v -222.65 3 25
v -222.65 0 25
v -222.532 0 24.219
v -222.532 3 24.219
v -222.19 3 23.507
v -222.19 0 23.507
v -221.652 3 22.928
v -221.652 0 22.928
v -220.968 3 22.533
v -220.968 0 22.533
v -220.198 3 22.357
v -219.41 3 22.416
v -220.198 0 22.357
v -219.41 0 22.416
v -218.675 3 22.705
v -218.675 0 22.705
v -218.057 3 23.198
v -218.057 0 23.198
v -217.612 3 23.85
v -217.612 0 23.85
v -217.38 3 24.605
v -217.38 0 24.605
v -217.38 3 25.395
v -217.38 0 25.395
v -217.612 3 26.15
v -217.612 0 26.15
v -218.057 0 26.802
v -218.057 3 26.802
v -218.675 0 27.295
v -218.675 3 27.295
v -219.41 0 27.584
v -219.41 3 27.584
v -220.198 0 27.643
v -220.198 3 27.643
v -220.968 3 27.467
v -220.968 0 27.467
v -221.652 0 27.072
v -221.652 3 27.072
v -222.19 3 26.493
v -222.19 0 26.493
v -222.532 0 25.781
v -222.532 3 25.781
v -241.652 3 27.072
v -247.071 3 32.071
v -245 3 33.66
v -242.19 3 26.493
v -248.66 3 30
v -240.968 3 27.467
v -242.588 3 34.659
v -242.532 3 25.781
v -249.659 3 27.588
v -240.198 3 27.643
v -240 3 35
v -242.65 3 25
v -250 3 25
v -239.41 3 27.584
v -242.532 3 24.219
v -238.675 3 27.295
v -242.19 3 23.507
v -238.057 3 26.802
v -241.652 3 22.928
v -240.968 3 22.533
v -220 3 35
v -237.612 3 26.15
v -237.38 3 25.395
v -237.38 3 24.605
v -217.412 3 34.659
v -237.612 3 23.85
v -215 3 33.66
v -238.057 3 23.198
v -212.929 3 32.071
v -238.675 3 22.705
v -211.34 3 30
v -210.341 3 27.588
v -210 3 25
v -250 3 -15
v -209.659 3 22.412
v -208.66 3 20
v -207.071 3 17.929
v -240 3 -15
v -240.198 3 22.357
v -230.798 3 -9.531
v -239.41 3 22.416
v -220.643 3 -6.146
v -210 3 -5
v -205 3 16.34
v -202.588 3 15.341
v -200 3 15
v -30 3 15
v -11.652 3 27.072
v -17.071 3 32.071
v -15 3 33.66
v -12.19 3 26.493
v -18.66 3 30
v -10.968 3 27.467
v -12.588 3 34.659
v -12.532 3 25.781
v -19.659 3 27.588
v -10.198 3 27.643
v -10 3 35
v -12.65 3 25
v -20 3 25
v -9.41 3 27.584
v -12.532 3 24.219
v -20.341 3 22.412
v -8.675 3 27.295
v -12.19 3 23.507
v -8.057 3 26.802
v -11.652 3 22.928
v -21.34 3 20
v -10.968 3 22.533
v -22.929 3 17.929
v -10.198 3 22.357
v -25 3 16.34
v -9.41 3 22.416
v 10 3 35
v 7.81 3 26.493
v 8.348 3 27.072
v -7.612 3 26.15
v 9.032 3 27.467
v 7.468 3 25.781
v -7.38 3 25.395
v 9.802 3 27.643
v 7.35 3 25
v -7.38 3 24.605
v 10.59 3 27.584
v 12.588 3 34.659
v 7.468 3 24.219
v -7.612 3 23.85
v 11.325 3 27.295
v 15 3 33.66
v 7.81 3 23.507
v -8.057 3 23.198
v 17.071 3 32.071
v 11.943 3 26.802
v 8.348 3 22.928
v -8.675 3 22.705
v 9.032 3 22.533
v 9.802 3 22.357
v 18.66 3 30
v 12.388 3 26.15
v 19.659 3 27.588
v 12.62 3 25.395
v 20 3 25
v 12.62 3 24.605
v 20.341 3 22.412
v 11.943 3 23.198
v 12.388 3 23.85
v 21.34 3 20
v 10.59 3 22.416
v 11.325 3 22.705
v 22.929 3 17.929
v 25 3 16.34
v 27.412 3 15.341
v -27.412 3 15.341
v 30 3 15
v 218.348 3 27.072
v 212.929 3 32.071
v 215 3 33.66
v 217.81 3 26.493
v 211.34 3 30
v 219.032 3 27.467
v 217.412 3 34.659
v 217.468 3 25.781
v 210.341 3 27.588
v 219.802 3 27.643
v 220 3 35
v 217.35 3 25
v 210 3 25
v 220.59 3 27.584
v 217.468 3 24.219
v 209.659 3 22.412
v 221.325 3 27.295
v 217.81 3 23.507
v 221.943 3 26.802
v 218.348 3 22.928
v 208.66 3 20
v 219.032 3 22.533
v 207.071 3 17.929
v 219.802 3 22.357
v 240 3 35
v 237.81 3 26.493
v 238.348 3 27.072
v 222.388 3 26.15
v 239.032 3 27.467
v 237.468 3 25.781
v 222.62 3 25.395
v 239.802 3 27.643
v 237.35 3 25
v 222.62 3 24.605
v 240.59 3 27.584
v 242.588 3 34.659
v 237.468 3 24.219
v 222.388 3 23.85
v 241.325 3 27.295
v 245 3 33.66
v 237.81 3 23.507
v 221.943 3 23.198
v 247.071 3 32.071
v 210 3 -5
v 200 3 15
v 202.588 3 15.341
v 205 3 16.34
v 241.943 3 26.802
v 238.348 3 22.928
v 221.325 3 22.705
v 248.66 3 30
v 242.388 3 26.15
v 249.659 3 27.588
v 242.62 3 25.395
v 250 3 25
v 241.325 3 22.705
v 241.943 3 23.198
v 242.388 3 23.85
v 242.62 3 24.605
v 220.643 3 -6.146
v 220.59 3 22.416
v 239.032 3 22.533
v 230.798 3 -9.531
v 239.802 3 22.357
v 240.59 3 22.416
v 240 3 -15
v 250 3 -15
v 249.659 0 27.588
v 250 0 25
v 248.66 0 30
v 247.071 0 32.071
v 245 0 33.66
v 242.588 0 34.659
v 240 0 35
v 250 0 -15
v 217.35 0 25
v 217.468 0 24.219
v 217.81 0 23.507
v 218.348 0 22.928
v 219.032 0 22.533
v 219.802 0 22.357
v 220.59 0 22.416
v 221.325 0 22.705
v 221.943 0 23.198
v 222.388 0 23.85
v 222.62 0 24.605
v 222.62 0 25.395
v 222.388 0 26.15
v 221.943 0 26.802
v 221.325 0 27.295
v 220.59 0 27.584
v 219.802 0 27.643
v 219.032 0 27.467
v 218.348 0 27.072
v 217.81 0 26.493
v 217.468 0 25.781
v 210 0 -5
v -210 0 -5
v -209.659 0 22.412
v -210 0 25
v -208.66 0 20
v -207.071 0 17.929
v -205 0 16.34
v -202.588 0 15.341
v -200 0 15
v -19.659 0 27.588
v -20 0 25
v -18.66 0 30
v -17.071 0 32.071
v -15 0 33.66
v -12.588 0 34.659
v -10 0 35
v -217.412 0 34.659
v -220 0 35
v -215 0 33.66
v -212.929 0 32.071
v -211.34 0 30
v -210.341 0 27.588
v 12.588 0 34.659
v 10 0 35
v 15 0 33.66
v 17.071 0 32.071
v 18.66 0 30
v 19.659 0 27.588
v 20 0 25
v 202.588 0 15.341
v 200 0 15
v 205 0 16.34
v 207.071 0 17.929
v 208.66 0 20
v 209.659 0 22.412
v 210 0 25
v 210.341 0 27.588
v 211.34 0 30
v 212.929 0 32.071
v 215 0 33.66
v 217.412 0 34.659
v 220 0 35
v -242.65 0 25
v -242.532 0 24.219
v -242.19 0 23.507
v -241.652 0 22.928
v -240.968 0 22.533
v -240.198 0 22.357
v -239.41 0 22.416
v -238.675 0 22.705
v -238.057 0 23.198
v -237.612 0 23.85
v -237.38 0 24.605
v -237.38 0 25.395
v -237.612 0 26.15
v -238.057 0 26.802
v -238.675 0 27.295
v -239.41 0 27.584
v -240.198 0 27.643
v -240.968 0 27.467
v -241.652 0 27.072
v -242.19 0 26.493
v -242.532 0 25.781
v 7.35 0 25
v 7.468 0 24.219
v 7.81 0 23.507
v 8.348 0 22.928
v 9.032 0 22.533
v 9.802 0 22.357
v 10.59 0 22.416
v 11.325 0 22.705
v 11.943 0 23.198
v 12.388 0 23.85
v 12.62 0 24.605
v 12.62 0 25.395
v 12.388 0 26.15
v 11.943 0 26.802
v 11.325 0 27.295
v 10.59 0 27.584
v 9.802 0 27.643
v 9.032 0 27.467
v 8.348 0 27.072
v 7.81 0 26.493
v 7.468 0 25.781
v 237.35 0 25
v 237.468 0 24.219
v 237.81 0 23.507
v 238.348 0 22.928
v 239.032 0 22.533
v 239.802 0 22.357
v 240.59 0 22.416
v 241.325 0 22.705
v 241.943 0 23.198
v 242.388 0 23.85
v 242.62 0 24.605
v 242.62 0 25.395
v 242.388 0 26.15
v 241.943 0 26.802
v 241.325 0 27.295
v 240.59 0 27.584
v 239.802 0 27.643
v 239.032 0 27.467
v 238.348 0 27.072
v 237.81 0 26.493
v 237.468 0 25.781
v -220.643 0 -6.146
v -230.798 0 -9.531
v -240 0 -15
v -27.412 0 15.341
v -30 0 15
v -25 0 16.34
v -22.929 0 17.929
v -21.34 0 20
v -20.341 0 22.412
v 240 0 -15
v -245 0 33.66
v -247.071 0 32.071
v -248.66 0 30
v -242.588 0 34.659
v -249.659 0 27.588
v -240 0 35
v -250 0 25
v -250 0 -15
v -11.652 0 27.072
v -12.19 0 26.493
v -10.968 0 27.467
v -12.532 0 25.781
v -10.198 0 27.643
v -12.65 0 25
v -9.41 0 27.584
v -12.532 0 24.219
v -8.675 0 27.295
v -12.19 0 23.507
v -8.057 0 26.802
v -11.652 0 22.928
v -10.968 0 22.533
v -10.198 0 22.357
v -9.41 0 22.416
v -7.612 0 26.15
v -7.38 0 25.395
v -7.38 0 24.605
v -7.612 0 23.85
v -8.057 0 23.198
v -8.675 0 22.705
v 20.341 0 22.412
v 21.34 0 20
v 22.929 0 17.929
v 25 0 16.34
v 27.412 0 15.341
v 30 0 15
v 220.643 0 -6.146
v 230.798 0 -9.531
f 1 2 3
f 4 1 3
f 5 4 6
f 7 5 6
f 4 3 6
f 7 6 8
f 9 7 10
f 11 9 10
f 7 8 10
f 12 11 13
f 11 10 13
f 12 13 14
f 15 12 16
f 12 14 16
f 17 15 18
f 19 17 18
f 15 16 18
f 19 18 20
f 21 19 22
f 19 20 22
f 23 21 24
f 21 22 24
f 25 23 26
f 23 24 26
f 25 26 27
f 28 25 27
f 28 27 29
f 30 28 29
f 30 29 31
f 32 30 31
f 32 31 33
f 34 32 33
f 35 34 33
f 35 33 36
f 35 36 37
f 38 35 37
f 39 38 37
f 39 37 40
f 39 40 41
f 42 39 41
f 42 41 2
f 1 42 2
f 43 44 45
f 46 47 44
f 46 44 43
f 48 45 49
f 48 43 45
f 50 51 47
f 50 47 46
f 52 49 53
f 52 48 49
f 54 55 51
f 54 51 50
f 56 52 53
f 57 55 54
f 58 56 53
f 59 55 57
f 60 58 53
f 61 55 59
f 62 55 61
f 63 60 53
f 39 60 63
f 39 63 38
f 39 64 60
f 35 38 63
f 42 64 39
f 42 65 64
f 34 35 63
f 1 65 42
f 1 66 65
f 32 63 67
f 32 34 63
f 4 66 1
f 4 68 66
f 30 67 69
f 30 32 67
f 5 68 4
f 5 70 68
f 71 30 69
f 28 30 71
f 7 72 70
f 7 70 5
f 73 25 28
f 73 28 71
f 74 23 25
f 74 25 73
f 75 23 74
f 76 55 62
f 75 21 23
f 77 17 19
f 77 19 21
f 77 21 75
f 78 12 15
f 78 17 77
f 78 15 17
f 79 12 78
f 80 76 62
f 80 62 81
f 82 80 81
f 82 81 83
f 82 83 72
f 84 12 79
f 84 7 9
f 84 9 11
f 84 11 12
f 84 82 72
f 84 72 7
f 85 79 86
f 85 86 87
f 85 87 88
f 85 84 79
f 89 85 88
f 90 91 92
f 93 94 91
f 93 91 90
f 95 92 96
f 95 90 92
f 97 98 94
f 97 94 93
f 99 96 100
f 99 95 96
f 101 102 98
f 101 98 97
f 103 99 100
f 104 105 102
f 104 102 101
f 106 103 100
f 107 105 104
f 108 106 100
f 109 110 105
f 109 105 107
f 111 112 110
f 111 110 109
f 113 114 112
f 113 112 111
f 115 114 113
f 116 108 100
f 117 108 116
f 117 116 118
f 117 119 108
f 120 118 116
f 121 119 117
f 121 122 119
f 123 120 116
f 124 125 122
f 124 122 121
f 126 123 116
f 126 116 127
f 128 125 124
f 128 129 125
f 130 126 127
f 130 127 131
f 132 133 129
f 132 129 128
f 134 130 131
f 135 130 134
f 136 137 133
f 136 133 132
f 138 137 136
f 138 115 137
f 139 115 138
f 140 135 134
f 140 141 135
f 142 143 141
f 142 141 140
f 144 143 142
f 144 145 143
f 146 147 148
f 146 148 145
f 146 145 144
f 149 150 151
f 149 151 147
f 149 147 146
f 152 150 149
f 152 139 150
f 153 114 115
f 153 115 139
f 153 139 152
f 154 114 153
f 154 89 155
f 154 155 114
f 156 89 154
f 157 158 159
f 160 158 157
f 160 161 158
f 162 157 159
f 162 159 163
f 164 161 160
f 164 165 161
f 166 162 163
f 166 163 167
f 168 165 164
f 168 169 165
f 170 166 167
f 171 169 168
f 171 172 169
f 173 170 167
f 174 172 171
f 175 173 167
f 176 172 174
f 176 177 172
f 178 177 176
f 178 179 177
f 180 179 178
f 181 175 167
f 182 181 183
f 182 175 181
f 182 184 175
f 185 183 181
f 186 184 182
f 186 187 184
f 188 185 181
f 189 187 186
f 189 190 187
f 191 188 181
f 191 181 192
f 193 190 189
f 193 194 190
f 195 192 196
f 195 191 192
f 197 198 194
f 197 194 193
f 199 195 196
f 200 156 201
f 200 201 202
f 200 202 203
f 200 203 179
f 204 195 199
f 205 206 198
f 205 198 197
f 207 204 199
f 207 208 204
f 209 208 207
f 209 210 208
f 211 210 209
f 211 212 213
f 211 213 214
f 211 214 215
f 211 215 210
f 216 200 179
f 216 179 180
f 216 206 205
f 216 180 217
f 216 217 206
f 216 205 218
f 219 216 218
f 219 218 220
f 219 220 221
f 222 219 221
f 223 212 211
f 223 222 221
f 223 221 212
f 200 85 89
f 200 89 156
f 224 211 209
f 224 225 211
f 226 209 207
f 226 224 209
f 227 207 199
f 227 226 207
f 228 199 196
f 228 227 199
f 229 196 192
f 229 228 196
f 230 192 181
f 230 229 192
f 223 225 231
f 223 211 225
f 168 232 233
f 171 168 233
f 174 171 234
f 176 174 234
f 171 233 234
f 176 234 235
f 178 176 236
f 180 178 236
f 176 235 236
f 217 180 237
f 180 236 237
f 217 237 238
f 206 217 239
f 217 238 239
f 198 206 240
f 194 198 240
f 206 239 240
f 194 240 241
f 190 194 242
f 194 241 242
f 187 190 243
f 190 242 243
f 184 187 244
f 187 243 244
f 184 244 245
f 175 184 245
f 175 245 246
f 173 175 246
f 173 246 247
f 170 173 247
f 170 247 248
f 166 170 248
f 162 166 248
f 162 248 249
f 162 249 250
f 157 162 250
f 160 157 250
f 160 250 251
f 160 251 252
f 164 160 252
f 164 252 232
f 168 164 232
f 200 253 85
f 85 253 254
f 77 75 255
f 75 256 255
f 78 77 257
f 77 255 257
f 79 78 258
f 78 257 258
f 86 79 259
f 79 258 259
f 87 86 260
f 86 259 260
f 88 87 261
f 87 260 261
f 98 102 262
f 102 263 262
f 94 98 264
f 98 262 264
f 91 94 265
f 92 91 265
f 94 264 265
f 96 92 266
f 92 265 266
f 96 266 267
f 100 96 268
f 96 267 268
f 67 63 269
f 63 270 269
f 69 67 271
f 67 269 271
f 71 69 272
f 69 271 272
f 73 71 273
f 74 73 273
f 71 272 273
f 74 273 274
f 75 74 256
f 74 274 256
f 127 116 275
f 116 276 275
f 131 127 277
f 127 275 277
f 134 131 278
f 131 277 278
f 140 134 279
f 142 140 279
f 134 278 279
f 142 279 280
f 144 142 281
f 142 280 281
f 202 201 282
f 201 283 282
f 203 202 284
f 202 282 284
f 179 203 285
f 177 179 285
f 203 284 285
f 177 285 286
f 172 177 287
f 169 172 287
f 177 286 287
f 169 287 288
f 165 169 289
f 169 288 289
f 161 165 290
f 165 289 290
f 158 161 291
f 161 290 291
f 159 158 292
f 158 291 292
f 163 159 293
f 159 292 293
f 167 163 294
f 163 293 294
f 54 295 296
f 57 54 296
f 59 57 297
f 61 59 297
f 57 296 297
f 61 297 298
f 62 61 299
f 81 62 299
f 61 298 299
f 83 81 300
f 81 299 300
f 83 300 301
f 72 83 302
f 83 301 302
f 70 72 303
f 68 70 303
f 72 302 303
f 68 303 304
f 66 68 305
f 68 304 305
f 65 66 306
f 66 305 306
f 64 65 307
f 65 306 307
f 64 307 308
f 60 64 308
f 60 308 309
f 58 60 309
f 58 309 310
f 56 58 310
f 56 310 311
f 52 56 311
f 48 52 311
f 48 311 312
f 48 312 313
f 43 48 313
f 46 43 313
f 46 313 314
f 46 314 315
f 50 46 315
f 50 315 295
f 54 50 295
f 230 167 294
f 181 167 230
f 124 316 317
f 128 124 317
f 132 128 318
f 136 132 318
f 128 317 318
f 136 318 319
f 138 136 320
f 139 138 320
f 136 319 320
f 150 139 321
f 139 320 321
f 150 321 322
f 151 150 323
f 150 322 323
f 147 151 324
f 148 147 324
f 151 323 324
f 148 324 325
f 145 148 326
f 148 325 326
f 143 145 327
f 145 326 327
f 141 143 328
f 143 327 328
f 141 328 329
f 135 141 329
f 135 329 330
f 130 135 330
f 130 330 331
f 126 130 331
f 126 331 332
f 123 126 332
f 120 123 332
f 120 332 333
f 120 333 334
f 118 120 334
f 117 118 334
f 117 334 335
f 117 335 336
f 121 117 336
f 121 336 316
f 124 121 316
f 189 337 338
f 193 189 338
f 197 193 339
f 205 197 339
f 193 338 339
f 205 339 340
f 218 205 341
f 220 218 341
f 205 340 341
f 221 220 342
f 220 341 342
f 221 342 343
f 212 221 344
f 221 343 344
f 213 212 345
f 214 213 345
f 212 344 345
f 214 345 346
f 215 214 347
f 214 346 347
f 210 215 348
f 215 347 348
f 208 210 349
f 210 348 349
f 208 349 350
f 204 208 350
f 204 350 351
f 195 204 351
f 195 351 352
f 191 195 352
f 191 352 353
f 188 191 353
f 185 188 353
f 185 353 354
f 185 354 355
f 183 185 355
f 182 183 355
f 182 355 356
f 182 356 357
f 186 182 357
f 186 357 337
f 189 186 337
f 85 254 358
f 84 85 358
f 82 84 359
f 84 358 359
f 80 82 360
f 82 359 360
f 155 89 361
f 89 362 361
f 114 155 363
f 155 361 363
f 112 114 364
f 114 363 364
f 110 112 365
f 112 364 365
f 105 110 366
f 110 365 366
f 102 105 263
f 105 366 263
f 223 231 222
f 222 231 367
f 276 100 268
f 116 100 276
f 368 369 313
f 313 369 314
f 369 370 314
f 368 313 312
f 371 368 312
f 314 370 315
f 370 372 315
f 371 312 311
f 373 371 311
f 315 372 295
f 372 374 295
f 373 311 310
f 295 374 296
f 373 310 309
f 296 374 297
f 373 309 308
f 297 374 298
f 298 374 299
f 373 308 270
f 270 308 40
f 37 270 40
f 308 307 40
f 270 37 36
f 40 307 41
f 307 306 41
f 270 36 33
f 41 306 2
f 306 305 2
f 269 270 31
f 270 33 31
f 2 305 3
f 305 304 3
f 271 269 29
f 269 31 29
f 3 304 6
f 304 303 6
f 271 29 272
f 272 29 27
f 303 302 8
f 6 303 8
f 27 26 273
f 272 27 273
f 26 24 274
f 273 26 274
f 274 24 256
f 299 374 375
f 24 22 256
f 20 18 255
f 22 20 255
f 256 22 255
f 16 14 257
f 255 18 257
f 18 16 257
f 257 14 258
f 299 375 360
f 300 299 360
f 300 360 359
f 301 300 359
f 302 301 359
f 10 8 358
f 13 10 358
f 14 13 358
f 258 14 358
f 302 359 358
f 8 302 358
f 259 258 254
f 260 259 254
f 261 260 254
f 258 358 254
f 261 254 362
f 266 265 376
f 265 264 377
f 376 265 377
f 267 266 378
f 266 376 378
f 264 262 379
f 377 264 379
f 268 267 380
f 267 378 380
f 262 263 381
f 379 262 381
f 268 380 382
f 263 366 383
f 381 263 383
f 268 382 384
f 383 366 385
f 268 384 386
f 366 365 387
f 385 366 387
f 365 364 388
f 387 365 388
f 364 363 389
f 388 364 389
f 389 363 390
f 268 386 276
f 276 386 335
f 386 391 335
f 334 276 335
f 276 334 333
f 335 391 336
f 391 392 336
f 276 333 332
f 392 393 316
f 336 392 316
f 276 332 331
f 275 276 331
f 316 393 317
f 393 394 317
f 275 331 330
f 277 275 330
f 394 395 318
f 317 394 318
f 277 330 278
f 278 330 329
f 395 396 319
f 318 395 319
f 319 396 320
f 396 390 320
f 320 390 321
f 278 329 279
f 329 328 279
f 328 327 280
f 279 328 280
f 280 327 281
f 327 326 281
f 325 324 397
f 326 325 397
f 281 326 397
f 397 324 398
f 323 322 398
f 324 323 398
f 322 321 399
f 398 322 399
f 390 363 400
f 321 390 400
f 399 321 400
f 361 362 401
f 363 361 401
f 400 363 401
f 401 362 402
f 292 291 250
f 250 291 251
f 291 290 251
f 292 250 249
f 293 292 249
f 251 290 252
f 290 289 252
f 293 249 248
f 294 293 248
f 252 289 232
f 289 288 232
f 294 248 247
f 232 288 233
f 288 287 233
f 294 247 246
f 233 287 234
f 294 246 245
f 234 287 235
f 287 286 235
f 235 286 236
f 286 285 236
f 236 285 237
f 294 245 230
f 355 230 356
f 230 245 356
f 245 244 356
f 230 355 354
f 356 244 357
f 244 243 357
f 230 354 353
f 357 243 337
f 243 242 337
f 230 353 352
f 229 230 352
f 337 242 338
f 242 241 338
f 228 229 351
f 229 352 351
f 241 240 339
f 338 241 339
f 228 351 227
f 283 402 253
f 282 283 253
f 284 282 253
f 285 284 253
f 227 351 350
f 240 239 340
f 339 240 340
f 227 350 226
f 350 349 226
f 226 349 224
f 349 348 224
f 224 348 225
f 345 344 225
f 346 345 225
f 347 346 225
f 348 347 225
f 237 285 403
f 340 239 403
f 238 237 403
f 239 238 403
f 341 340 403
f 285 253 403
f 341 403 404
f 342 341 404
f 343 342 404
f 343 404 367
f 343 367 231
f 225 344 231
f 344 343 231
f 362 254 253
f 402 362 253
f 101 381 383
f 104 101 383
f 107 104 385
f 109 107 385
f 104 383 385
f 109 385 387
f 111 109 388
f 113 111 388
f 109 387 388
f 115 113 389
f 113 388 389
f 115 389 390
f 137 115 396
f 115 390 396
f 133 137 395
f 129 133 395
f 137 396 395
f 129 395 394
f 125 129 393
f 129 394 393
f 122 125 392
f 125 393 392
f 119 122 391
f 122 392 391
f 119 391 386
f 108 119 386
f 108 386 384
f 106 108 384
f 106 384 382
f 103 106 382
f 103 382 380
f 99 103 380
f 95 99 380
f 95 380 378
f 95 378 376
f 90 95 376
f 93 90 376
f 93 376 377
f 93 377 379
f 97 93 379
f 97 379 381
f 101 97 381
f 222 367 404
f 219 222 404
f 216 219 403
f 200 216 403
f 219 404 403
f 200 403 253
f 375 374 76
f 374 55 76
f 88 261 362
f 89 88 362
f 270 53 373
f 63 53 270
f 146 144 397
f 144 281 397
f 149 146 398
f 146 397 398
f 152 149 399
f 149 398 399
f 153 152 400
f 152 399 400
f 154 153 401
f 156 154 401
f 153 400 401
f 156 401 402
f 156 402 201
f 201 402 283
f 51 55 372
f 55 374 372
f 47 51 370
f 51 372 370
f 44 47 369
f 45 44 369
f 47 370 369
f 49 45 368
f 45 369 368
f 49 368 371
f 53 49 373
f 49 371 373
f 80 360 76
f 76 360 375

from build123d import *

# Parameters (mm, degrees)
EXTRUDE_1_DEPTH        = 3
SKETCH_2_W             = 40
SKETCH_2_H             = 20
EXTRUDE_2_DEPTH        = 3
HOLE_WIZARD_M51_D      = 5.3
PATTERN_LINEAR_1_COUNT = 3
PATTERN_LINEAR_1_PITCH = 230
FILLET_1_R             = 10


with BuildPart() as part:
    # Эскиз1 → Бобышка-Вытянуть1 (new body)
    with BuildSketch(Plane(origin=(0, 0, 0), x_dir=(1, 0, 0), z_dir=(0, 1, 0))):
        with BuildLine():
            Line((210, 5), (-210, 5))
            ThreePointArc((-210, 5), (-225.811388301, 7.565835097), (-240, 15))
            Line((-240, 15), (-250, 15))
            Line((-250, 15), (-250, -15))
            Line((-250, -15), (250, -15))
            Line((250, -15), (250, 15))
            Line((250, 15), (240, 15))
            ThreePointArc((240, 15), (225.811388301, 7.565835097), (210, 5))
        make_face()
    extrude(amount=EXTRUDE_1_DEPTH)

    # Эскиз2 → Бобышка-Вытянуть2 (add)
    with BuildSketch(Plane(origin=(0, 3, 0), x_dir=(1, 0, 0), z_dir=(0, 1, 0))):
        with Locations((230, -25)):
            Rectangle(SKETCH_2_W, SKETCH_2_H)
    extrude_2 = extrude(amount=-EXTRUDE_2_DEPTH)

    # Отверстие с зазором M51 (through all)
    with Locations(Plane(origin=(0, 3, 0), x_dir=(1, 0, 0), z_dir=(0, 1, 0))):
        with Locations((220, -25), (240, -25)):
            hole_wizard_m51 = Hole(HOLE_WIZARD_M51_D / 2)

    # Линейный массив1: Бобышка-Вытянуть2, Отверстие с зазором M51 ×3
    with Locations(*[(-i * PATTERN_LINEAR_1_PITCH, 0, 0) for i in range(1, PATTERN_LINEAR_1_COUNT)]):
        add(extrude_2)
        add(hole_wizard_m51, mode=Mode.SUBTRACT)

    # Скругление1
    fillet_1_edges = [part.edges().sort_by_distance(p)[0] for p in [
        (-250, 1.5, 35),
        (-210, 1.5, 35),
        (-210, 1.5, 15),
        (-20, 1.5, 15),
        (-20, 1.5, 35),
        (20, 1.5, 35),
        (20, 1.5, 15),
        (210, 1.5, 15),
        (250, 1.5, 35),
        (210, 1.5, 35),
    ]]
    fillet(fillet_1_edges, radius=FILLET_1_R - 0.0001)  # a hair under: the kernel refuses the full size


solid = part.part
